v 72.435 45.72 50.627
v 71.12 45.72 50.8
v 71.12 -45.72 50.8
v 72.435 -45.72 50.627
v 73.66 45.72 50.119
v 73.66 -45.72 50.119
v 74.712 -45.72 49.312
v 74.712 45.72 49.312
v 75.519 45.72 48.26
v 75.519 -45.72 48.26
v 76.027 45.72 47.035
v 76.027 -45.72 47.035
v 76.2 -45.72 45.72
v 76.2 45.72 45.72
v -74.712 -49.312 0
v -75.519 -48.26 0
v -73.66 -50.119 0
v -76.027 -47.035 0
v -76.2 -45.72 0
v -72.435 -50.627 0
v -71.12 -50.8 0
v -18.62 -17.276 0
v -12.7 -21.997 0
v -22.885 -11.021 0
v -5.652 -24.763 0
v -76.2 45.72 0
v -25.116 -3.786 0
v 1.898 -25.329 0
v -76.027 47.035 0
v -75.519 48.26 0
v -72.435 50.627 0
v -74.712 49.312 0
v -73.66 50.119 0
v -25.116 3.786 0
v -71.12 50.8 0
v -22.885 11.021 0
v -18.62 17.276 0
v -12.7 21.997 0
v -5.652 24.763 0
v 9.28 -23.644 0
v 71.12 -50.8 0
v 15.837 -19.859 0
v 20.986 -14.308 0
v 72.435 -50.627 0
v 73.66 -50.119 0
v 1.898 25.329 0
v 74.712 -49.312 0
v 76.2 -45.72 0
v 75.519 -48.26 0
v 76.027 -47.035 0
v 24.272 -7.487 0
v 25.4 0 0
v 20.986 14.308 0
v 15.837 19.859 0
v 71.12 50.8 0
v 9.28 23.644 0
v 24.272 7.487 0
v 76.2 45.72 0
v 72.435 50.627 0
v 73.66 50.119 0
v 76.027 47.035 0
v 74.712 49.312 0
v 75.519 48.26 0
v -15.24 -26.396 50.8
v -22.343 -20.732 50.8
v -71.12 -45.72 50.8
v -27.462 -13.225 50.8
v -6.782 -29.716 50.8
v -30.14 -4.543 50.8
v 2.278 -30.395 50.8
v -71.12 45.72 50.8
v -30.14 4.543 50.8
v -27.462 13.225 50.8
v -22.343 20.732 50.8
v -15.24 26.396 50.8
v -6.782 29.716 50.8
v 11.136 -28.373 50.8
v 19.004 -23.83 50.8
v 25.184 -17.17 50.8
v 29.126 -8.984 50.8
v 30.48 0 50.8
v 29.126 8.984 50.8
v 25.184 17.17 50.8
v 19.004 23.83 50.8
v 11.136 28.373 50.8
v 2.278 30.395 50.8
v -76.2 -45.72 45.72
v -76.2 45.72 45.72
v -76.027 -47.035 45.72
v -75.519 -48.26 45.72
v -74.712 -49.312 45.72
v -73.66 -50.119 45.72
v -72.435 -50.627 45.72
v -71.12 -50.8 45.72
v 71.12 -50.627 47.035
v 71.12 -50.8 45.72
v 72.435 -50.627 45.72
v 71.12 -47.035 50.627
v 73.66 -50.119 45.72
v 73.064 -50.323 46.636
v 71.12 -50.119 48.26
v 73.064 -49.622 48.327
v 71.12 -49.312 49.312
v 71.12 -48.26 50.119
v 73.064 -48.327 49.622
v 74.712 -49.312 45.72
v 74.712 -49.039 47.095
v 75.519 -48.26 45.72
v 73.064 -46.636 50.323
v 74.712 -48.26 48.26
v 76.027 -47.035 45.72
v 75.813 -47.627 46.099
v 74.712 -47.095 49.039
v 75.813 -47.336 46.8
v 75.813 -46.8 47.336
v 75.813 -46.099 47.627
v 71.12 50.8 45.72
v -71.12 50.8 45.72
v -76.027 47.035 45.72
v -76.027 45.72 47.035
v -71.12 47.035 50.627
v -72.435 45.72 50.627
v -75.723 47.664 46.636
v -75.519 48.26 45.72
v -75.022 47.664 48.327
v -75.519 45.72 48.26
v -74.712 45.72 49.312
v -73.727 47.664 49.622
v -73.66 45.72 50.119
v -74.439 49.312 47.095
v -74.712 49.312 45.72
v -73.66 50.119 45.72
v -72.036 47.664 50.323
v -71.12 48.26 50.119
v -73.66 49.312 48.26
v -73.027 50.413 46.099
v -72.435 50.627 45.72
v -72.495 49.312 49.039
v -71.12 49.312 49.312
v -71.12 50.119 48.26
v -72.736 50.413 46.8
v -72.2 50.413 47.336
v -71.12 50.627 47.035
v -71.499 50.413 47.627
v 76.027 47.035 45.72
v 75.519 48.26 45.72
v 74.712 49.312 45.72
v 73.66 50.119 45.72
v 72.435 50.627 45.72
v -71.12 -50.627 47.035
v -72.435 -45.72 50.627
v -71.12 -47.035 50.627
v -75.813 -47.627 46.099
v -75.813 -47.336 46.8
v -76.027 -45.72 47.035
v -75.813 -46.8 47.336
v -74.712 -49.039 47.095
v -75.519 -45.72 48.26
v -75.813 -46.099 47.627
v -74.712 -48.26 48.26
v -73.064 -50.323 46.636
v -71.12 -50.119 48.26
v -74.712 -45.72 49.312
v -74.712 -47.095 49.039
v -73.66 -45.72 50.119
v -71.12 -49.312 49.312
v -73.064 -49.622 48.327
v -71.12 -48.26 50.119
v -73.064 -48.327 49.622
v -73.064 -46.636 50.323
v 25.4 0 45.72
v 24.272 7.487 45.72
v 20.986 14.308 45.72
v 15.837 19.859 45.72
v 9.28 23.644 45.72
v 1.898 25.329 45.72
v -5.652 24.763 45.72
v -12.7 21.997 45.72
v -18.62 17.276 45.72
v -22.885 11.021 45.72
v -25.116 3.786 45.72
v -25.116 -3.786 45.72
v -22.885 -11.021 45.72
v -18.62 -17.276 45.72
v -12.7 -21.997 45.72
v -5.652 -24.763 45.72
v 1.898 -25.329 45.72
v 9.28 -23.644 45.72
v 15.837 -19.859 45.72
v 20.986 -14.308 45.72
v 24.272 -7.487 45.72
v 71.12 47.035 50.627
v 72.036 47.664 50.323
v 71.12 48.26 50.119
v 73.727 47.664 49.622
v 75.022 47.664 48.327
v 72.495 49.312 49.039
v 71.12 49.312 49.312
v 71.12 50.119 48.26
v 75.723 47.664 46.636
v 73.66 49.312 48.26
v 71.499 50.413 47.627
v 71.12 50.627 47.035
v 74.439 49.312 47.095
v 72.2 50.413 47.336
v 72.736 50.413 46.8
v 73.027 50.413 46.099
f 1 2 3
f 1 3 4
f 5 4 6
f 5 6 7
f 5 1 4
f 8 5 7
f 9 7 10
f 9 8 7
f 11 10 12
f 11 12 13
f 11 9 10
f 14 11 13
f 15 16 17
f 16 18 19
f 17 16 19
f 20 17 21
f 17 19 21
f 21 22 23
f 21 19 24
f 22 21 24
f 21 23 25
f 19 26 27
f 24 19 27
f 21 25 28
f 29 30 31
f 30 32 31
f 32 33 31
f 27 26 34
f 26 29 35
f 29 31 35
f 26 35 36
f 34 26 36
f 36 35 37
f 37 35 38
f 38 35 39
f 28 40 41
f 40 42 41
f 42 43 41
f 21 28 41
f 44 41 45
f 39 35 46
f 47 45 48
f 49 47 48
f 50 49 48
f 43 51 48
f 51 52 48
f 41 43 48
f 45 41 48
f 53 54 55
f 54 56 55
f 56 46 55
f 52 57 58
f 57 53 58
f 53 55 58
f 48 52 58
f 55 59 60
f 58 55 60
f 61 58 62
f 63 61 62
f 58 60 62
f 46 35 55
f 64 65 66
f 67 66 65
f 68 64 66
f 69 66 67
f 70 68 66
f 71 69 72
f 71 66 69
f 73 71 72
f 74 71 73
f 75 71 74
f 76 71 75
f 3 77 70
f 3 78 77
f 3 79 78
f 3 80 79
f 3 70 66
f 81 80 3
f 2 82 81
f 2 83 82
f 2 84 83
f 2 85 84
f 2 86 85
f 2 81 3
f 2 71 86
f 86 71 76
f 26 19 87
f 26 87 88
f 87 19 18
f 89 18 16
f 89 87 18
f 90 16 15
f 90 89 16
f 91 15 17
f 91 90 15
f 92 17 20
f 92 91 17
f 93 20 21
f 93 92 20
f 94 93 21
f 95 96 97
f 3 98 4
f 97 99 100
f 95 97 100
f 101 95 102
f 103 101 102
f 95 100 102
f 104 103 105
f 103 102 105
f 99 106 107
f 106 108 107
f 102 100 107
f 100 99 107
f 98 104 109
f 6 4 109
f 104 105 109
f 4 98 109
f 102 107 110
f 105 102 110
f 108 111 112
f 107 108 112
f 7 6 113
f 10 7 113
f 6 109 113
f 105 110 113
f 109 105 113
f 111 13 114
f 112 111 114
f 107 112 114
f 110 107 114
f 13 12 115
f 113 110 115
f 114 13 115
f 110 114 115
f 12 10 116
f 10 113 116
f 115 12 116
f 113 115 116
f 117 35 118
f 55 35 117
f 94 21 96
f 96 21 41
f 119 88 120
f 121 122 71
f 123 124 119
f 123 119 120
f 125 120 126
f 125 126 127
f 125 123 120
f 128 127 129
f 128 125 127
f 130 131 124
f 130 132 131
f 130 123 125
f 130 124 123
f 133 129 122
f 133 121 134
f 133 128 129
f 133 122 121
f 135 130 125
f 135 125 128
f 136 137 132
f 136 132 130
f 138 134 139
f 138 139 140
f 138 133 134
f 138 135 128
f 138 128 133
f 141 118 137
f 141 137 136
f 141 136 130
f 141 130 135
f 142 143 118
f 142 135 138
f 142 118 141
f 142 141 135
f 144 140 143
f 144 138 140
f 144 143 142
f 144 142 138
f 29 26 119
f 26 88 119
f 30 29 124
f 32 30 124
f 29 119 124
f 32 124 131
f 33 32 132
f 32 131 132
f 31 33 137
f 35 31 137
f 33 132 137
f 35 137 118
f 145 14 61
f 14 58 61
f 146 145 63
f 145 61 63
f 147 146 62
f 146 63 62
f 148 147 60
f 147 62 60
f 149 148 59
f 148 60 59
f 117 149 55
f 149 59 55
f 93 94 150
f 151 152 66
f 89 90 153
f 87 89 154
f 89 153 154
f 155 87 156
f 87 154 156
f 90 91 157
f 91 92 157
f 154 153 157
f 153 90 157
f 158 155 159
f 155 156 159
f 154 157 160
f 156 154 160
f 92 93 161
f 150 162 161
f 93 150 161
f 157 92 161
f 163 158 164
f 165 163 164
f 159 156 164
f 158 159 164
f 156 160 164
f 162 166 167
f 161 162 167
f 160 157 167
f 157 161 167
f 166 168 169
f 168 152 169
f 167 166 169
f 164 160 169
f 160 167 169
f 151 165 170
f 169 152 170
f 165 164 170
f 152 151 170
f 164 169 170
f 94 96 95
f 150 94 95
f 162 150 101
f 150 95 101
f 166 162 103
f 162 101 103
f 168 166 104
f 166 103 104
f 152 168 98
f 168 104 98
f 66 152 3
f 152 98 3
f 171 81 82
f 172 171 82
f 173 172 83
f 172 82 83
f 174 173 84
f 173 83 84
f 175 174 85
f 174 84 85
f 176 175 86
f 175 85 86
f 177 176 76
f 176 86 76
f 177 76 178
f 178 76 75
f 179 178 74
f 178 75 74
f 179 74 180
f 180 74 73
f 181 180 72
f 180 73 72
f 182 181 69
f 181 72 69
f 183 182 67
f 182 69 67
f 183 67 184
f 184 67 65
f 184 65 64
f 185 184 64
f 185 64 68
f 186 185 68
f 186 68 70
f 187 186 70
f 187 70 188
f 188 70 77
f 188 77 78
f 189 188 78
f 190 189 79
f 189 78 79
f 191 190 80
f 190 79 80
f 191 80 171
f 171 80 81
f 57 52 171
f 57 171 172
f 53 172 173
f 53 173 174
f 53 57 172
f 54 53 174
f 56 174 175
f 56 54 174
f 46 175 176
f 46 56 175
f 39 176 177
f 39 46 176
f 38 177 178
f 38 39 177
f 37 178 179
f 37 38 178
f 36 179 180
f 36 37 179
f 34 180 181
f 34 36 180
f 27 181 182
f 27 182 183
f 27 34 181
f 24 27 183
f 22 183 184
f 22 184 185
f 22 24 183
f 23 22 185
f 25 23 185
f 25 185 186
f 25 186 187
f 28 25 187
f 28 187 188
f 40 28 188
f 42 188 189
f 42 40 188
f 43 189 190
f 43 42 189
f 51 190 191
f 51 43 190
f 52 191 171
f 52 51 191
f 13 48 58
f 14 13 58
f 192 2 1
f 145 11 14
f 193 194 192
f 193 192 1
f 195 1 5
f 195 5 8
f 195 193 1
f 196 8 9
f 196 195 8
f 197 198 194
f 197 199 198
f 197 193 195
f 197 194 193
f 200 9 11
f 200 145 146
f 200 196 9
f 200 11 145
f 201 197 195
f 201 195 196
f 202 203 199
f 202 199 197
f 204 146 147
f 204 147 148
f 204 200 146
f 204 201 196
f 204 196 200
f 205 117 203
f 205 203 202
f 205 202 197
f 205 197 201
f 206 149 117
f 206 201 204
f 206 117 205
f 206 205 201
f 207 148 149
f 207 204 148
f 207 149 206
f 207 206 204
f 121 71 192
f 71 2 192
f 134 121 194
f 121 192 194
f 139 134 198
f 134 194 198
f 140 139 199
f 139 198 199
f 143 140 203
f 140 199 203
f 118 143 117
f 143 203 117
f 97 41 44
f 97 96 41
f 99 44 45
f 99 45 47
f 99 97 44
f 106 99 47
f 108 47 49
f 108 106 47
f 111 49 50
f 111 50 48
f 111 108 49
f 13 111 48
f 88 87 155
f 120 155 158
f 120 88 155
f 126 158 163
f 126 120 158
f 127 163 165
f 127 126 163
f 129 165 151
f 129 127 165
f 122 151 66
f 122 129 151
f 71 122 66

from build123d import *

# Parameters (mm, degrees)
F0_W     = 152.4
F0_H     = 101.6
F0_R     = 25.4
F1_DEPTH = 50.8
F2_R     = 5.08
F3_R     = 5.08
F4_R     = 5.08
F5_R     = 5.08
F6_SIZE  = 5.08


with BuildPart() as f1:
    # F0 (on Top) → F1 (new body)
    with BuildSketch(Plane.XY):
        Rectangle(F0_W, F0_H)
        Circle(F0_R, mode=Mode.SUBTRACT)
    extrude(amount=F1_DEPTH)

    # F2
    f2_edges = [f1.edges().sort_by_distance(p)[0] for p in [
        (0, -50.8, 50.8),
    ]]
    fillet(f2_edges, radius=F2_R)

    # F3
    f3_edges = [f1.edges().sort_by_distance(p)[0] for p in [
        (76.2, 2.54, 50.8),
    ]]
    fillet(f3_edges, radius=F3_R)

    # F4
    f4_edges = [f1.edges().sort_by_distance(p)[0] for p in [
        (-76.2, 2.54, 50.8),
    ]]
    fillet(f4_edges, radius=F4_R)

    # F5
    f5_edges = [f1.edges().sort_by_distance(p)[0] for p in [
        (-71.12, 2.54, 50.8),
        (0, 50.8, 50.8),
    ]]
    fillet(f5_edges, radius=F5_R)

    # F6
    f6_edges = [f1.edges().sort_by_distance(p)[0] for p in [
        (-25.4, 0, 50.8),
    ]]
    chamfer(f6_edges, length=F6_SIZE)


solid = f1.part
